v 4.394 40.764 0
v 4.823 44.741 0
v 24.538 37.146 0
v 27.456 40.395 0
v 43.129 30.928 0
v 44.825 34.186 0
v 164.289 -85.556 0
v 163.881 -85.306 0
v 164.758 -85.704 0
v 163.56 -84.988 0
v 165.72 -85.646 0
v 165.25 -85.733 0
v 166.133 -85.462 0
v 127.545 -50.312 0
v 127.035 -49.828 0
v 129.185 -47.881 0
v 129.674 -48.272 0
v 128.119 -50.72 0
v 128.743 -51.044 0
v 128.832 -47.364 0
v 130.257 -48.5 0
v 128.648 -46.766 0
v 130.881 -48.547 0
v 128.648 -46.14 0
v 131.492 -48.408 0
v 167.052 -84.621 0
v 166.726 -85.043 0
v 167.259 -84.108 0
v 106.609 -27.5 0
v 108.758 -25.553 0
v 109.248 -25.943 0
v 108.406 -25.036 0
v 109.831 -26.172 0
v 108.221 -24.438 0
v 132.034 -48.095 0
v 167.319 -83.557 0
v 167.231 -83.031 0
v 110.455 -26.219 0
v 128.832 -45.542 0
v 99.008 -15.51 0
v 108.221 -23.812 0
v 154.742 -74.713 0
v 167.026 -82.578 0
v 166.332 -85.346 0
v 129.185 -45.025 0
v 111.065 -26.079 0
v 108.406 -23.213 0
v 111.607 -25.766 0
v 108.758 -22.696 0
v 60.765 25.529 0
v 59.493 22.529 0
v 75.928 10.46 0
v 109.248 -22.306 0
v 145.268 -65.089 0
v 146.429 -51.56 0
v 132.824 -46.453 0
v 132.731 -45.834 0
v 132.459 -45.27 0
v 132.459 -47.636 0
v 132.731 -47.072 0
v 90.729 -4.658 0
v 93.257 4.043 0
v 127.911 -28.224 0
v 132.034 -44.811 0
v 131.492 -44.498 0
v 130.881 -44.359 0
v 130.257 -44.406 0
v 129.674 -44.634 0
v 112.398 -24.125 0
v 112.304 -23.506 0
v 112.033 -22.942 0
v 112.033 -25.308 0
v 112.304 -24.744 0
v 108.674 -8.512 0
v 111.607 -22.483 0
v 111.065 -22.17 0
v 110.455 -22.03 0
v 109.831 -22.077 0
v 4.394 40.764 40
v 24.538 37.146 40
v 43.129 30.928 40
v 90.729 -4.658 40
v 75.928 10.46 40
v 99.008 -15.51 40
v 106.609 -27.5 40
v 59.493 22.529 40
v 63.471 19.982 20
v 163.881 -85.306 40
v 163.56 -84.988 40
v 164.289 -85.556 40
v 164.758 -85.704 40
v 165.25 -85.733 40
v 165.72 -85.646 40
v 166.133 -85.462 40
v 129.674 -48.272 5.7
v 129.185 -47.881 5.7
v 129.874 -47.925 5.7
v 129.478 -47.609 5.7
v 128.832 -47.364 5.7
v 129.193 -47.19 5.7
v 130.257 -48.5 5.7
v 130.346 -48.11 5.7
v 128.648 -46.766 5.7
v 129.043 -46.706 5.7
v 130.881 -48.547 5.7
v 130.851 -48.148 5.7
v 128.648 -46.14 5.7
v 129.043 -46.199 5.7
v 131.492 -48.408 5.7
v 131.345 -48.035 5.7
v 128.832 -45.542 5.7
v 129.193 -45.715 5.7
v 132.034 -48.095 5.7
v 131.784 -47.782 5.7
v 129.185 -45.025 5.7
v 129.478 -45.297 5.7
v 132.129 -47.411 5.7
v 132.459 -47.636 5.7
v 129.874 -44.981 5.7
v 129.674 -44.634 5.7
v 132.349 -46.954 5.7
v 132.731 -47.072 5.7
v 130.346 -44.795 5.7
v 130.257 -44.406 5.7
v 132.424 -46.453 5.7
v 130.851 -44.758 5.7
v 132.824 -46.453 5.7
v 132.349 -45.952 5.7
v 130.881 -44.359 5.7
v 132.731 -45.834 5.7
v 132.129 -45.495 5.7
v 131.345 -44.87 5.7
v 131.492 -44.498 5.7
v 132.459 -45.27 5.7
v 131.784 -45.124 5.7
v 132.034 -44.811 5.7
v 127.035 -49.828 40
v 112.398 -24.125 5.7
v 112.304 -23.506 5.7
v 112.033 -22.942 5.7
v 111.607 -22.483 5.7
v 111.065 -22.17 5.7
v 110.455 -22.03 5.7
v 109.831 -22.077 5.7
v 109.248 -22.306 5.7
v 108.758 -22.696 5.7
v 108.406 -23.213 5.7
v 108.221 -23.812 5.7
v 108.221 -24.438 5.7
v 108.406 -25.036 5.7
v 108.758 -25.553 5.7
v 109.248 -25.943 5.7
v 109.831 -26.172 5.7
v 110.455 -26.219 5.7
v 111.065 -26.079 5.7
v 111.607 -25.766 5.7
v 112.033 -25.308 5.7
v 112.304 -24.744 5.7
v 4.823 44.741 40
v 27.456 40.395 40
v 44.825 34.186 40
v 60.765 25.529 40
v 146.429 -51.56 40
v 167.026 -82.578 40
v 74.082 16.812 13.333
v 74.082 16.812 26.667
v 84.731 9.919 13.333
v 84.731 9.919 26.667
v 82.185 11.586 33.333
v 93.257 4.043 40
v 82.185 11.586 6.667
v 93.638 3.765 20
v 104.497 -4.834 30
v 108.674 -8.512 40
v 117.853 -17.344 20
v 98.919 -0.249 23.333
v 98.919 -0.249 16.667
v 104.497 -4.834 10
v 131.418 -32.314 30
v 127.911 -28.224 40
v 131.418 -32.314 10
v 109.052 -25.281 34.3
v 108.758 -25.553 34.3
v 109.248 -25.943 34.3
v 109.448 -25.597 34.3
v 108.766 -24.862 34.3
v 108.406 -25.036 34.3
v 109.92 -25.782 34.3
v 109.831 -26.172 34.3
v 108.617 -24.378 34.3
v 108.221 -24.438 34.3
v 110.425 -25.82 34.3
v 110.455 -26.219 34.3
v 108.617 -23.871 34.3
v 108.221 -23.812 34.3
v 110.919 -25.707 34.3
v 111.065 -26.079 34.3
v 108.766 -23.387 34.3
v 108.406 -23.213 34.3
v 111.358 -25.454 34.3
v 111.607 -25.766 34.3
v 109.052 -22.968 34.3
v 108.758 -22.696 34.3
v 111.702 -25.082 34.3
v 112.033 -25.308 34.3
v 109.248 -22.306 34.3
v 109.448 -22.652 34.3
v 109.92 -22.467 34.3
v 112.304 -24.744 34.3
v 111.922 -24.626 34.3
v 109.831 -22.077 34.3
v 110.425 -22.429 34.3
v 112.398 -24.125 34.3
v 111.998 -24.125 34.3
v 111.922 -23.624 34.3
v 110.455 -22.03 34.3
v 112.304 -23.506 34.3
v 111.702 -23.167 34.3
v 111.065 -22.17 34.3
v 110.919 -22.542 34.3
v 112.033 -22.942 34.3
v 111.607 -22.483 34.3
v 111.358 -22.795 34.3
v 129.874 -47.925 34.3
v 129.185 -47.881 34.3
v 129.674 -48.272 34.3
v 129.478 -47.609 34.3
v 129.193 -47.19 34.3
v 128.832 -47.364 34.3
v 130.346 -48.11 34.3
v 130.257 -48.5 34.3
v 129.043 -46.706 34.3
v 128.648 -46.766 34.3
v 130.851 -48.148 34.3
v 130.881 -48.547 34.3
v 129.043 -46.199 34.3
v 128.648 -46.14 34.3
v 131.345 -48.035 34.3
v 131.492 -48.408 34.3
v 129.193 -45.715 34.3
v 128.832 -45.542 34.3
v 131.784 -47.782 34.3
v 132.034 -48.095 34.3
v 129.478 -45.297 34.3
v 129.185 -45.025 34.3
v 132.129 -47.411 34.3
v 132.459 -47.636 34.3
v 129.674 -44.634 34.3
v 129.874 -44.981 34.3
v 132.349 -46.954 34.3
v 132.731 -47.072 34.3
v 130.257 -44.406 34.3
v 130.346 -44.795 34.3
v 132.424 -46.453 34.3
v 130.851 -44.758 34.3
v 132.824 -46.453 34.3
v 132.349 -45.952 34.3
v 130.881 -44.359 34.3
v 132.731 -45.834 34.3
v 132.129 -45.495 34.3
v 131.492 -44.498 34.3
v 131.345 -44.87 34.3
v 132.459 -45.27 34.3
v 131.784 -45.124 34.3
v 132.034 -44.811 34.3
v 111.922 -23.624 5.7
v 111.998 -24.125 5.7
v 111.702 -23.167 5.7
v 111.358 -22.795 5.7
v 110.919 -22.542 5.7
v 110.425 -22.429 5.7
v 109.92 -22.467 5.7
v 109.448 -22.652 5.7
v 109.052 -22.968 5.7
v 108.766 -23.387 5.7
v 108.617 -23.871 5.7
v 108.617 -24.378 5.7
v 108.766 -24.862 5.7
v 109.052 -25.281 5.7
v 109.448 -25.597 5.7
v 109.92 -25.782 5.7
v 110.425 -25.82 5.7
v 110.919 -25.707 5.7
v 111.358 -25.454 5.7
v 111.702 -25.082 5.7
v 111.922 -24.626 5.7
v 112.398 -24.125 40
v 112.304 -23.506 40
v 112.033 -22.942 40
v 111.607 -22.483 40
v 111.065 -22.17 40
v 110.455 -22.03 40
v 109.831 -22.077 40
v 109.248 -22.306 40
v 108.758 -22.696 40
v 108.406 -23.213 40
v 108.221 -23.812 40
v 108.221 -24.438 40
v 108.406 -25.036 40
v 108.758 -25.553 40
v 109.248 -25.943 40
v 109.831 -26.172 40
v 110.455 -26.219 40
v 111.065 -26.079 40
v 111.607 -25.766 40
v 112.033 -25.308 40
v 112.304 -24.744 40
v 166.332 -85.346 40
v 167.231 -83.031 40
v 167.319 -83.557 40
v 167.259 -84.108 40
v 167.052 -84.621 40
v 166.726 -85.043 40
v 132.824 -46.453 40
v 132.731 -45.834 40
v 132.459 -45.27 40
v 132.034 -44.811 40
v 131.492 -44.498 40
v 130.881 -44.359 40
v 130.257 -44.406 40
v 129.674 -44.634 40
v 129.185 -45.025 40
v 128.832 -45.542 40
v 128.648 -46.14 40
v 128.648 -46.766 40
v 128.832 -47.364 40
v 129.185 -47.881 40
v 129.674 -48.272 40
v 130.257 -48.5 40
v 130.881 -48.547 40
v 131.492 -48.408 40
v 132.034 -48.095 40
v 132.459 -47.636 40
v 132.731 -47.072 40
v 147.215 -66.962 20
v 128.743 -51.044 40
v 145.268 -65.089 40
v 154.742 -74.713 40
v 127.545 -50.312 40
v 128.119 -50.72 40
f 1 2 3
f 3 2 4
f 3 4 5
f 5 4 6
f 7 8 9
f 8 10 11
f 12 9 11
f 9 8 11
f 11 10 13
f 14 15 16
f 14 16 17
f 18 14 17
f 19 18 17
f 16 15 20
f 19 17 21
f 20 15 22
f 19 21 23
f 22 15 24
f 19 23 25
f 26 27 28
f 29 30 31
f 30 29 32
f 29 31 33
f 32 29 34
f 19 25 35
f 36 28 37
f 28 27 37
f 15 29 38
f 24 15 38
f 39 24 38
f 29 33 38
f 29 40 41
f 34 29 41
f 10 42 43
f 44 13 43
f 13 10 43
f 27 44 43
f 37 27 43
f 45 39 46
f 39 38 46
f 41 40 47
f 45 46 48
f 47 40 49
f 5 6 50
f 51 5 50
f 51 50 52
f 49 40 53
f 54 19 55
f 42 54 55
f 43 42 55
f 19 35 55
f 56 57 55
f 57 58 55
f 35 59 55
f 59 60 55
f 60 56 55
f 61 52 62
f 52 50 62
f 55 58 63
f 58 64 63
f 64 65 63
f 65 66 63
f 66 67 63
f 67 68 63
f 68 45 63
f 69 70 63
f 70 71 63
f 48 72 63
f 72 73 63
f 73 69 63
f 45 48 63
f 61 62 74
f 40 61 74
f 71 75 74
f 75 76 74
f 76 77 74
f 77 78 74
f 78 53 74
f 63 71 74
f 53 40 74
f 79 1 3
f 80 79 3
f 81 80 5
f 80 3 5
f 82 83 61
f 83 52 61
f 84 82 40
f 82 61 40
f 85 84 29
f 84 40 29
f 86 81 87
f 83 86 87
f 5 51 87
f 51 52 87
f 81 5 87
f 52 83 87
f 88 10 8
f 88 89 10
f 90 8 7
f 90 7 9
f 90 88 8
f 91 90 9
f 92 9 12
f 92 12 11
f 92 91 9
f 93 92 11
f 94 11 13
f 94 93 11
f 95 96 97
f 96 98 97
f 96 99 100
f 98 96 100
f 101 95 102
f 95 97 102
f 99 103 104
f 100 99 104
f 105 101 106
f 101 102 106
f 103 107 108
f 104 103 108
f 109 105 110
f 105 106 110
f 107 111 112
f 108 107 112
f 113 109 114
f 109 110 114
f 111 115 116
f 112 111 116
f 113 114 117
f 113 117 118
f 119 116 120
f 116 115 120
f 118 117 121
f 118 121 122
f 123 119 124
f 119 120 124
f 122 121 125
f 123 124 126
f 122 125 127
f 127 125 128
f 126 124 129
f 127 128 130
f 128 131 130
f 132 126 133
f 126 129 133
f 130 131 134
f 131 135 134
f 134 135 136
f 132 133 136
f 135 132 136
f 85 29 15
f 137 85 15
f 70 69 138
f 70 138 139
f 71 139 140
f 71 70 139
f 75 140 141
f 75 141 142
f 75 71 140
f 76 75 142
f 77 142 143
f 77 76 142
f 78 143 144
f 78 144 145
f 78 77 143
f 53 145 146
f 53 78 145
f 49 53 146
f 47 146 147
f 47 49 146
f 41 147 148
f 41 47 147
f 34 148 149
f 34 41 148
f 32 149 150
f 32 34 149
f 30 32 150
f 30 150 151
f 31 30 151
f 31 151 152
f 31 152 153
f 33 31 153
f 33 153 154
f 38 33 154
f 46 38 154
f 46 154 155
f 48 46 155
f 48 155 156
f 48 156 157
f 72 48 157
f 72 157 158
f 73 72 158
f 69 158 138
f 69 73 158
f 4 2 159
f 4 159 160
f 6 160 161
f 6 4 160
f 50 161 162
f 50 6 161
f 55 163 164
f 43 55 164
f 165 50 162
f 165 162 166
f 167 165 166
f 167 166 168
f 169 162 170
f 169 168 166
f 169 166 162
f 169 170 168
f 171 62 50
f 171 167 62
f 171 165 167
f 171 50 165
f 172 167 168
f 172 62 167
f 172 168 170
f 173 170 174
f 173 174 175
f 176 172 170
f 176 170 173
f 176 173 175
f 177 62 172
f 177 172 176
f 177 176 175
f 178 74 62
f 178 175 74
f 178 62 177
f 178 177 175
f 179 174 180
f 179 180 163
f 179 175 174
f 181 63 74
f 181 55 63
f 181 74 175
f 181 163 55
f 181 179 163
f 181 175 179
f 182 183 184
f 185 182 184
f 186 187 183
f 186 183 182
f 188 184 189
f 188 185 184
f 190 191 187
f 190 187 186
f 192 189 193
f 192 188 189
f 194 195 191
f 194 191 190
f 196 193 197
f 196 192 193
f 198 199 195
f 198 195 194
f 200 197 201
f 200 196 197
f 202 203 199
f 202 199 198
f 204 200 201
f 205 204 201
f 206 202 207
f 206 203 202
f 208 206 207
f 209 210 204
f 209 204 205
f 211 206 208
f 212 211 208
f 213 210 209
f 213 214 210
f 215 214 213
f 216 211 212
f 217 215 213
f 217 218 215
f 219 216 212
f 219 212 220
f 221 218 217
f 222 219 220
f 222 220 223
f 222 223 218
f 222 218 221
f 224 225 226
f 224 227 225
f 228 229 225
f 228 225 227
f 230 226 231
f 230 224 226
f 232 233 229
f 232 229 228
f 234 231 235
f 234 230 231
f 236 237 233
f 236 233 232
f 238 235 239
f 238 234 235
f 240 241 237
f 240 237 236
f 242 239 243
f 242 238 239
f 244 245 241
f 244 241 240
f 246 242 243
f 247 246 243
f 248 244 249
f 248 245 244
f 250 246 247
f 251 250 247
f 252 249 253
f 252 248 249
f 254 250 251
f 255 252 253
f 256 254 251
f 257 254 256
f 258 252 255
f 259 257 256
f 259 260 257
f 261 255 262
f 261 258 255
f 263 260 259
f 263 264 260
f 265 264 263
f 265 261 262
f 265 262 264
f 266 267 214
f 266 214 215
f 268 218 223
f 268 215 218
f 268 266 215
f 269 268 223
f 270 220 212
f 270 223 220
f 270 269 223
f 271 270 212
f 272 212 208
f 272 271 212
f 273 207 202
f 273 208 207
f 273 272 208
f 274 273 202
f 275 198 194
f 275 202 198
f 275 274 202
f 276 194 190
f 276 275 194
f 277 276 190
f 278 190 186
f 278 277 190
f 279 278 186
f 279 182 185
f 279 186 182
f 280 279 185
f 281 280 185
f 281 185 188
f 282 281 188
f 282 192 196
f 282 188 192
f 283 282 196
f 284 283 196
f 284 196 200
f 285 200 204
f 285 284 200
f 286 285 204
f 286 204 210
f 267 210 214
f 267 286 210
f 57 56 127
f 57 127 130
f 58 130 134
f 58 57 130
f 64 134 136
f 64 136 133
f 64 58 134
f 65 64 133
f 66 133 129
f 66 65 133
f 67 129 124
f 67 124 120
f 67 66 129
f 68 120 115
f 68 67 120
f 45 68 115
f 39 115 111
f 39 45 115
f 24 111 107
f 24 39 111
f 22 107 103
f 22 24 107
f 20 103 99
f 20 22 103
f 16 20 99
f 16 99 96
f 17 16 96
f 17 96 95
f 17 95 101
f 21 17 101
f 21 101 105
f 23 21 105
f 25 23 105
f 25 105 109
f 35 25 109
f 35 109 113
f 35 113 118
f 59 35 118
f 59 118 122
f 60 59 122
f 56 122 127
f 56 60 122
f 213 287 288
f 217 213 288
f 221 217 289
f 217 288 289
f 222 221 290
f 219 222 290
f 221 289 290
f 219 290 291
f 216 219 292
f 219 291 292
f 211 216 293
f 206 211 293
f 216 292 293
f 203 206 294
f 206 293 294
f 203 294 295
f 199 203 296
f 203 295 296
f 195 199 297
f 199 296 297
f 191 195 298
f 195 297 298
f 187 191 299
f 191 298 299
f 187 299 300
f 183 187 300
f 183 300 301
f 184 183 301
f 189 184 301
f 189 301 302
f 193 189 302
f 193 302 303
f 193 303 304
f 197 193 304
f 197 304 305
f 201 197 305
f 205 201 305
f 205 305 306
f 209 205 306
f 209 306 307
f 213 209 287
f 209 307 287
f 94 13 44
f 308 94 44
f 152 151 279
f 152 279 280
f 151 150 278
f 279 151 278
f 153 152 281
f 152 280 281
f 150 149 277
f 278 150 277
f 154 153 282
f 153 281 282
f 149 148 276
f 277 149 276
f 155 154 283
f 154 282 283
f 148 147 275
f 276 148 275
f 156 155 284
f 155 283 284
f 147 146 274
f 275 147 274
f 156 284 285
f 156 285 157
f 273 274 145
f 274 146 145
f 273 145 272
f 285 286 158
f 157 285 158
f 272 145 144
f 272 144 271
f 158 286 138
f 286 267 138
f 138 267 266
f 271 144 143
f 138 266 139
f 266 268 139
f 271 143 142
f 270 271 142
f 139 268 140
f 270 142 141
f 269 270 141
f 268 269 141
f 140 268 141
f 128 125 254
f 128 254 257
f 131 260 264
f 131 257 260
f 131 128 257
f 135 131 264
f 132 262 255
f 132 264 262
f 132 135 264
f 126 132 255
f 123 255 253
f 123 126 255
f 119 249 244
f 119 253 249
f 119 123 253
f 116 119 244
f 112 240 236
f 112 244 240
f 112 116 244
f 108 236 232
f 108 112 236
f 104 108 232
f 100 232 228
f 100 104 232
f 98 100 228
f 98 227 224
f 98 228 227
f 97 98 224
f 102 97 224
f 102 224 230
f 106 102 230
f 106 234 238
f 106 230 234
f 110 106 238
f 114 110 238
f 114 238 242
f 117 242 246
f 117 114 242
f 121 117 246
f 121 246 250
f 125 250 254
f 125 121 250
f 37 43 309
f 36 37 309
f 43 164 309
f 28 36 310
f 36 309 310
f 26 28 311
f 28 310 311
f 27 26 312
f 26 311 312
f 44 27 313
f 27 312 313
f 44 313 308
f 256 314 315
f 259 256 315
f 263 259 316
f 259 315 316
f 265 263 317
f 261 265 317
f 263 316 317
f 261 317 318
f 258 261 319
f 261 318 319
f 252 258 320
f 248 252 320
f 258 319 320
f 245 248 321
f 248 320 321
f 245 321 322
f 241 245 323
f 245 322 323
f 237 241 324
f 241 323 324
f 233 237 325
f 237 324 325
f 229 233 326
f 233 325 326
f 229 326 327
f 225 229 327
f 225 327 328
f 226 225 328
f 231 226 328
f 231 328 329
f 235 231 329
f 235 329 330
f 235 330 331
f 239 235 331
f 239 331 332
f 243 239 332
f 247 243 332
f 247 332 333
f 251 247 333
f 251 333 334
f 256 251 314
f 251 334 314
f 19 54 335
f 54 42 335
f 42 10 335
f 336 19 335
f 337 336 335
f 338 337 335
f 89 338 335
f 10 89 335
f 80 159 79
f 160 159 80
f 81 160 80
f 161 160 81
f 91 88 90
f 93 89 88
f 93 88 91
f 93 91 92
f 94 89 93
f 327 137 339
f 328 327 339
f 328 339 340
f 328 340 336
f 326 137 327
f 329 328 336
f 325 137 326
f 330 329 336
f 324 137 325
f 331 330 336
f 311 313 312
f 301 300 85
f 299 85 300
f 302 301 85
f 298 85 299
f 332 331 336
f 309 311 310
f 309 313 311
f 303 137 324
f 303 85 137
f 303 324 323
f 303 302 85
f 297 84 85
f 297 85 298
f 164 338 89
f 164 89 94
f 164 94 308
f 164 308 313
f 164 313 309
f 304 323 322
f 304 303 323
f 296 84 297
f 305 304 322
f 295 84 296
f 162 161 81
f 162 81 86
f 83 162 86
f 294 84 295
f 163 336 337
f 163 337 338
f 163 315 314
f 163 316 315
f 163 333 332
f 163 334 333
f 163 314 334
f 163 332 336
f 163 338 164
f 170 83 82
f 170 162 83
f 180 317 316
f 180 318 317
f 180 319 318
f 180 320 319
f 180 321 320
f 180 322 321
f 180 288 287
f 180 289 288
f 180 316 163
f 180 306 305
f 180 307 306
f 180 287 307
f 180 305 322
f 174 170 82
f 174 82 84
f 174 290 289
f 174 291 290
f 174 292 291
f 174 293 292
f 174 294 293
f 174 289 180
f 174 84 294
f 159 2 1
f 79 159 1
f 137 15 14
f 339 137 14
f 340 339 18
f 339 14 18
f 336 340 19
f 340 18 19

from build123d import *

# Parameters (mm, degrees)
SKETCH1_R           = 1.7
BOSS_EXTRUDE1_DEPTH = 40
FILLET1_R           = 2
SKETCH2_R           = 2.1
CUT_EXTRUDE1_DEPTH  = 5.7


with BuildPart() as part:
    # Sketch1 → Boss-Extrude1 (new body)
    with BuildSketch(Plane.XY):
        with BuildLine():
            Line((106.608651808, -27.499525749), (127.035219834, -49.827804726))
            ThreePointArc((127.035219834, -49.827804726), (127.824871389, -50.526309273), (128.743429567, -51.043715355))
            add(Edge.make_bspline(
                [(128.743429567, -51.043715355), (148.968438393, -66.433726049), (164.6351141, -86.341662758)],
                knots=[0, 0, 0, 1, 1, 1], degree=2))
            Line((164.6351141, -86.341662758), (168.084692517, -84.317331861))
            add(Edge.make_bspline(
                [(4.823156258, 44.740777415), (41.684065008, 40.20447098), (60.016315143, 25.549909268), (92.15426, 5.406490208), (129.856421907, -21.250775717), (168.084692517, -84.317331861)],
                knots=[0, 0, 0, 0, 0.53605532, 0.63605532, 1, 1, 1, 1], degree=3))
            Line((4.823156258, 44.740777415), (4.394431257, 40.763819423))
            add(Edge.make_bspline(
                [(4.394431257, 40.763819423), (71.440728315, 33.332394502), (106.608651808, -27.499525749)],
                knots=[0, 0, 0, 1, 1, 1], degree=2))
        make_face()
        with Locations((130.724364716, -46.452866202)):
            Circle(SKETCH1_R, mode=Mode.SUBTRACT)
        with Locations((110.29779669, -24.124587225)):
            Circle(SKETCH1_R, mode=Mode.SUBTRACT)
    extrude(amount=BOSS_EXTRUDE1_DEPTH)

    # Fillet1
    fillet1_edges = [part.edges().sort_by_distance(p)[0] for p in [
        (164.6351141, -86.341662758, 20),
        (168.084692517, -84.317331861, 20),
    ]]
    fillet(fillet1_edges, radius=FILLET1_R)

    # Sketch2 → Cut-Extrude1 (cut)
    with BuildSketch(Plane.XY.offset(40)):
        with Locations((110.29779669, -24.124587225)):
            Circle(SKETCH2_R)
        with Locations((130.724364716, -46.452866202)):
            Circle(SKETCH2_R)
    cut_extrude1 = extrude(amount=-CUT_EXTRUDE1_DEPTH, mode=Mode.SUBTRACT)

    # Mirror1: Cut-Extrude1 across plane
    add(cut_extrude1.mirror(Plane.XY.offset(20)), mode=Mode.SUBTRACT)


solid = part.part
